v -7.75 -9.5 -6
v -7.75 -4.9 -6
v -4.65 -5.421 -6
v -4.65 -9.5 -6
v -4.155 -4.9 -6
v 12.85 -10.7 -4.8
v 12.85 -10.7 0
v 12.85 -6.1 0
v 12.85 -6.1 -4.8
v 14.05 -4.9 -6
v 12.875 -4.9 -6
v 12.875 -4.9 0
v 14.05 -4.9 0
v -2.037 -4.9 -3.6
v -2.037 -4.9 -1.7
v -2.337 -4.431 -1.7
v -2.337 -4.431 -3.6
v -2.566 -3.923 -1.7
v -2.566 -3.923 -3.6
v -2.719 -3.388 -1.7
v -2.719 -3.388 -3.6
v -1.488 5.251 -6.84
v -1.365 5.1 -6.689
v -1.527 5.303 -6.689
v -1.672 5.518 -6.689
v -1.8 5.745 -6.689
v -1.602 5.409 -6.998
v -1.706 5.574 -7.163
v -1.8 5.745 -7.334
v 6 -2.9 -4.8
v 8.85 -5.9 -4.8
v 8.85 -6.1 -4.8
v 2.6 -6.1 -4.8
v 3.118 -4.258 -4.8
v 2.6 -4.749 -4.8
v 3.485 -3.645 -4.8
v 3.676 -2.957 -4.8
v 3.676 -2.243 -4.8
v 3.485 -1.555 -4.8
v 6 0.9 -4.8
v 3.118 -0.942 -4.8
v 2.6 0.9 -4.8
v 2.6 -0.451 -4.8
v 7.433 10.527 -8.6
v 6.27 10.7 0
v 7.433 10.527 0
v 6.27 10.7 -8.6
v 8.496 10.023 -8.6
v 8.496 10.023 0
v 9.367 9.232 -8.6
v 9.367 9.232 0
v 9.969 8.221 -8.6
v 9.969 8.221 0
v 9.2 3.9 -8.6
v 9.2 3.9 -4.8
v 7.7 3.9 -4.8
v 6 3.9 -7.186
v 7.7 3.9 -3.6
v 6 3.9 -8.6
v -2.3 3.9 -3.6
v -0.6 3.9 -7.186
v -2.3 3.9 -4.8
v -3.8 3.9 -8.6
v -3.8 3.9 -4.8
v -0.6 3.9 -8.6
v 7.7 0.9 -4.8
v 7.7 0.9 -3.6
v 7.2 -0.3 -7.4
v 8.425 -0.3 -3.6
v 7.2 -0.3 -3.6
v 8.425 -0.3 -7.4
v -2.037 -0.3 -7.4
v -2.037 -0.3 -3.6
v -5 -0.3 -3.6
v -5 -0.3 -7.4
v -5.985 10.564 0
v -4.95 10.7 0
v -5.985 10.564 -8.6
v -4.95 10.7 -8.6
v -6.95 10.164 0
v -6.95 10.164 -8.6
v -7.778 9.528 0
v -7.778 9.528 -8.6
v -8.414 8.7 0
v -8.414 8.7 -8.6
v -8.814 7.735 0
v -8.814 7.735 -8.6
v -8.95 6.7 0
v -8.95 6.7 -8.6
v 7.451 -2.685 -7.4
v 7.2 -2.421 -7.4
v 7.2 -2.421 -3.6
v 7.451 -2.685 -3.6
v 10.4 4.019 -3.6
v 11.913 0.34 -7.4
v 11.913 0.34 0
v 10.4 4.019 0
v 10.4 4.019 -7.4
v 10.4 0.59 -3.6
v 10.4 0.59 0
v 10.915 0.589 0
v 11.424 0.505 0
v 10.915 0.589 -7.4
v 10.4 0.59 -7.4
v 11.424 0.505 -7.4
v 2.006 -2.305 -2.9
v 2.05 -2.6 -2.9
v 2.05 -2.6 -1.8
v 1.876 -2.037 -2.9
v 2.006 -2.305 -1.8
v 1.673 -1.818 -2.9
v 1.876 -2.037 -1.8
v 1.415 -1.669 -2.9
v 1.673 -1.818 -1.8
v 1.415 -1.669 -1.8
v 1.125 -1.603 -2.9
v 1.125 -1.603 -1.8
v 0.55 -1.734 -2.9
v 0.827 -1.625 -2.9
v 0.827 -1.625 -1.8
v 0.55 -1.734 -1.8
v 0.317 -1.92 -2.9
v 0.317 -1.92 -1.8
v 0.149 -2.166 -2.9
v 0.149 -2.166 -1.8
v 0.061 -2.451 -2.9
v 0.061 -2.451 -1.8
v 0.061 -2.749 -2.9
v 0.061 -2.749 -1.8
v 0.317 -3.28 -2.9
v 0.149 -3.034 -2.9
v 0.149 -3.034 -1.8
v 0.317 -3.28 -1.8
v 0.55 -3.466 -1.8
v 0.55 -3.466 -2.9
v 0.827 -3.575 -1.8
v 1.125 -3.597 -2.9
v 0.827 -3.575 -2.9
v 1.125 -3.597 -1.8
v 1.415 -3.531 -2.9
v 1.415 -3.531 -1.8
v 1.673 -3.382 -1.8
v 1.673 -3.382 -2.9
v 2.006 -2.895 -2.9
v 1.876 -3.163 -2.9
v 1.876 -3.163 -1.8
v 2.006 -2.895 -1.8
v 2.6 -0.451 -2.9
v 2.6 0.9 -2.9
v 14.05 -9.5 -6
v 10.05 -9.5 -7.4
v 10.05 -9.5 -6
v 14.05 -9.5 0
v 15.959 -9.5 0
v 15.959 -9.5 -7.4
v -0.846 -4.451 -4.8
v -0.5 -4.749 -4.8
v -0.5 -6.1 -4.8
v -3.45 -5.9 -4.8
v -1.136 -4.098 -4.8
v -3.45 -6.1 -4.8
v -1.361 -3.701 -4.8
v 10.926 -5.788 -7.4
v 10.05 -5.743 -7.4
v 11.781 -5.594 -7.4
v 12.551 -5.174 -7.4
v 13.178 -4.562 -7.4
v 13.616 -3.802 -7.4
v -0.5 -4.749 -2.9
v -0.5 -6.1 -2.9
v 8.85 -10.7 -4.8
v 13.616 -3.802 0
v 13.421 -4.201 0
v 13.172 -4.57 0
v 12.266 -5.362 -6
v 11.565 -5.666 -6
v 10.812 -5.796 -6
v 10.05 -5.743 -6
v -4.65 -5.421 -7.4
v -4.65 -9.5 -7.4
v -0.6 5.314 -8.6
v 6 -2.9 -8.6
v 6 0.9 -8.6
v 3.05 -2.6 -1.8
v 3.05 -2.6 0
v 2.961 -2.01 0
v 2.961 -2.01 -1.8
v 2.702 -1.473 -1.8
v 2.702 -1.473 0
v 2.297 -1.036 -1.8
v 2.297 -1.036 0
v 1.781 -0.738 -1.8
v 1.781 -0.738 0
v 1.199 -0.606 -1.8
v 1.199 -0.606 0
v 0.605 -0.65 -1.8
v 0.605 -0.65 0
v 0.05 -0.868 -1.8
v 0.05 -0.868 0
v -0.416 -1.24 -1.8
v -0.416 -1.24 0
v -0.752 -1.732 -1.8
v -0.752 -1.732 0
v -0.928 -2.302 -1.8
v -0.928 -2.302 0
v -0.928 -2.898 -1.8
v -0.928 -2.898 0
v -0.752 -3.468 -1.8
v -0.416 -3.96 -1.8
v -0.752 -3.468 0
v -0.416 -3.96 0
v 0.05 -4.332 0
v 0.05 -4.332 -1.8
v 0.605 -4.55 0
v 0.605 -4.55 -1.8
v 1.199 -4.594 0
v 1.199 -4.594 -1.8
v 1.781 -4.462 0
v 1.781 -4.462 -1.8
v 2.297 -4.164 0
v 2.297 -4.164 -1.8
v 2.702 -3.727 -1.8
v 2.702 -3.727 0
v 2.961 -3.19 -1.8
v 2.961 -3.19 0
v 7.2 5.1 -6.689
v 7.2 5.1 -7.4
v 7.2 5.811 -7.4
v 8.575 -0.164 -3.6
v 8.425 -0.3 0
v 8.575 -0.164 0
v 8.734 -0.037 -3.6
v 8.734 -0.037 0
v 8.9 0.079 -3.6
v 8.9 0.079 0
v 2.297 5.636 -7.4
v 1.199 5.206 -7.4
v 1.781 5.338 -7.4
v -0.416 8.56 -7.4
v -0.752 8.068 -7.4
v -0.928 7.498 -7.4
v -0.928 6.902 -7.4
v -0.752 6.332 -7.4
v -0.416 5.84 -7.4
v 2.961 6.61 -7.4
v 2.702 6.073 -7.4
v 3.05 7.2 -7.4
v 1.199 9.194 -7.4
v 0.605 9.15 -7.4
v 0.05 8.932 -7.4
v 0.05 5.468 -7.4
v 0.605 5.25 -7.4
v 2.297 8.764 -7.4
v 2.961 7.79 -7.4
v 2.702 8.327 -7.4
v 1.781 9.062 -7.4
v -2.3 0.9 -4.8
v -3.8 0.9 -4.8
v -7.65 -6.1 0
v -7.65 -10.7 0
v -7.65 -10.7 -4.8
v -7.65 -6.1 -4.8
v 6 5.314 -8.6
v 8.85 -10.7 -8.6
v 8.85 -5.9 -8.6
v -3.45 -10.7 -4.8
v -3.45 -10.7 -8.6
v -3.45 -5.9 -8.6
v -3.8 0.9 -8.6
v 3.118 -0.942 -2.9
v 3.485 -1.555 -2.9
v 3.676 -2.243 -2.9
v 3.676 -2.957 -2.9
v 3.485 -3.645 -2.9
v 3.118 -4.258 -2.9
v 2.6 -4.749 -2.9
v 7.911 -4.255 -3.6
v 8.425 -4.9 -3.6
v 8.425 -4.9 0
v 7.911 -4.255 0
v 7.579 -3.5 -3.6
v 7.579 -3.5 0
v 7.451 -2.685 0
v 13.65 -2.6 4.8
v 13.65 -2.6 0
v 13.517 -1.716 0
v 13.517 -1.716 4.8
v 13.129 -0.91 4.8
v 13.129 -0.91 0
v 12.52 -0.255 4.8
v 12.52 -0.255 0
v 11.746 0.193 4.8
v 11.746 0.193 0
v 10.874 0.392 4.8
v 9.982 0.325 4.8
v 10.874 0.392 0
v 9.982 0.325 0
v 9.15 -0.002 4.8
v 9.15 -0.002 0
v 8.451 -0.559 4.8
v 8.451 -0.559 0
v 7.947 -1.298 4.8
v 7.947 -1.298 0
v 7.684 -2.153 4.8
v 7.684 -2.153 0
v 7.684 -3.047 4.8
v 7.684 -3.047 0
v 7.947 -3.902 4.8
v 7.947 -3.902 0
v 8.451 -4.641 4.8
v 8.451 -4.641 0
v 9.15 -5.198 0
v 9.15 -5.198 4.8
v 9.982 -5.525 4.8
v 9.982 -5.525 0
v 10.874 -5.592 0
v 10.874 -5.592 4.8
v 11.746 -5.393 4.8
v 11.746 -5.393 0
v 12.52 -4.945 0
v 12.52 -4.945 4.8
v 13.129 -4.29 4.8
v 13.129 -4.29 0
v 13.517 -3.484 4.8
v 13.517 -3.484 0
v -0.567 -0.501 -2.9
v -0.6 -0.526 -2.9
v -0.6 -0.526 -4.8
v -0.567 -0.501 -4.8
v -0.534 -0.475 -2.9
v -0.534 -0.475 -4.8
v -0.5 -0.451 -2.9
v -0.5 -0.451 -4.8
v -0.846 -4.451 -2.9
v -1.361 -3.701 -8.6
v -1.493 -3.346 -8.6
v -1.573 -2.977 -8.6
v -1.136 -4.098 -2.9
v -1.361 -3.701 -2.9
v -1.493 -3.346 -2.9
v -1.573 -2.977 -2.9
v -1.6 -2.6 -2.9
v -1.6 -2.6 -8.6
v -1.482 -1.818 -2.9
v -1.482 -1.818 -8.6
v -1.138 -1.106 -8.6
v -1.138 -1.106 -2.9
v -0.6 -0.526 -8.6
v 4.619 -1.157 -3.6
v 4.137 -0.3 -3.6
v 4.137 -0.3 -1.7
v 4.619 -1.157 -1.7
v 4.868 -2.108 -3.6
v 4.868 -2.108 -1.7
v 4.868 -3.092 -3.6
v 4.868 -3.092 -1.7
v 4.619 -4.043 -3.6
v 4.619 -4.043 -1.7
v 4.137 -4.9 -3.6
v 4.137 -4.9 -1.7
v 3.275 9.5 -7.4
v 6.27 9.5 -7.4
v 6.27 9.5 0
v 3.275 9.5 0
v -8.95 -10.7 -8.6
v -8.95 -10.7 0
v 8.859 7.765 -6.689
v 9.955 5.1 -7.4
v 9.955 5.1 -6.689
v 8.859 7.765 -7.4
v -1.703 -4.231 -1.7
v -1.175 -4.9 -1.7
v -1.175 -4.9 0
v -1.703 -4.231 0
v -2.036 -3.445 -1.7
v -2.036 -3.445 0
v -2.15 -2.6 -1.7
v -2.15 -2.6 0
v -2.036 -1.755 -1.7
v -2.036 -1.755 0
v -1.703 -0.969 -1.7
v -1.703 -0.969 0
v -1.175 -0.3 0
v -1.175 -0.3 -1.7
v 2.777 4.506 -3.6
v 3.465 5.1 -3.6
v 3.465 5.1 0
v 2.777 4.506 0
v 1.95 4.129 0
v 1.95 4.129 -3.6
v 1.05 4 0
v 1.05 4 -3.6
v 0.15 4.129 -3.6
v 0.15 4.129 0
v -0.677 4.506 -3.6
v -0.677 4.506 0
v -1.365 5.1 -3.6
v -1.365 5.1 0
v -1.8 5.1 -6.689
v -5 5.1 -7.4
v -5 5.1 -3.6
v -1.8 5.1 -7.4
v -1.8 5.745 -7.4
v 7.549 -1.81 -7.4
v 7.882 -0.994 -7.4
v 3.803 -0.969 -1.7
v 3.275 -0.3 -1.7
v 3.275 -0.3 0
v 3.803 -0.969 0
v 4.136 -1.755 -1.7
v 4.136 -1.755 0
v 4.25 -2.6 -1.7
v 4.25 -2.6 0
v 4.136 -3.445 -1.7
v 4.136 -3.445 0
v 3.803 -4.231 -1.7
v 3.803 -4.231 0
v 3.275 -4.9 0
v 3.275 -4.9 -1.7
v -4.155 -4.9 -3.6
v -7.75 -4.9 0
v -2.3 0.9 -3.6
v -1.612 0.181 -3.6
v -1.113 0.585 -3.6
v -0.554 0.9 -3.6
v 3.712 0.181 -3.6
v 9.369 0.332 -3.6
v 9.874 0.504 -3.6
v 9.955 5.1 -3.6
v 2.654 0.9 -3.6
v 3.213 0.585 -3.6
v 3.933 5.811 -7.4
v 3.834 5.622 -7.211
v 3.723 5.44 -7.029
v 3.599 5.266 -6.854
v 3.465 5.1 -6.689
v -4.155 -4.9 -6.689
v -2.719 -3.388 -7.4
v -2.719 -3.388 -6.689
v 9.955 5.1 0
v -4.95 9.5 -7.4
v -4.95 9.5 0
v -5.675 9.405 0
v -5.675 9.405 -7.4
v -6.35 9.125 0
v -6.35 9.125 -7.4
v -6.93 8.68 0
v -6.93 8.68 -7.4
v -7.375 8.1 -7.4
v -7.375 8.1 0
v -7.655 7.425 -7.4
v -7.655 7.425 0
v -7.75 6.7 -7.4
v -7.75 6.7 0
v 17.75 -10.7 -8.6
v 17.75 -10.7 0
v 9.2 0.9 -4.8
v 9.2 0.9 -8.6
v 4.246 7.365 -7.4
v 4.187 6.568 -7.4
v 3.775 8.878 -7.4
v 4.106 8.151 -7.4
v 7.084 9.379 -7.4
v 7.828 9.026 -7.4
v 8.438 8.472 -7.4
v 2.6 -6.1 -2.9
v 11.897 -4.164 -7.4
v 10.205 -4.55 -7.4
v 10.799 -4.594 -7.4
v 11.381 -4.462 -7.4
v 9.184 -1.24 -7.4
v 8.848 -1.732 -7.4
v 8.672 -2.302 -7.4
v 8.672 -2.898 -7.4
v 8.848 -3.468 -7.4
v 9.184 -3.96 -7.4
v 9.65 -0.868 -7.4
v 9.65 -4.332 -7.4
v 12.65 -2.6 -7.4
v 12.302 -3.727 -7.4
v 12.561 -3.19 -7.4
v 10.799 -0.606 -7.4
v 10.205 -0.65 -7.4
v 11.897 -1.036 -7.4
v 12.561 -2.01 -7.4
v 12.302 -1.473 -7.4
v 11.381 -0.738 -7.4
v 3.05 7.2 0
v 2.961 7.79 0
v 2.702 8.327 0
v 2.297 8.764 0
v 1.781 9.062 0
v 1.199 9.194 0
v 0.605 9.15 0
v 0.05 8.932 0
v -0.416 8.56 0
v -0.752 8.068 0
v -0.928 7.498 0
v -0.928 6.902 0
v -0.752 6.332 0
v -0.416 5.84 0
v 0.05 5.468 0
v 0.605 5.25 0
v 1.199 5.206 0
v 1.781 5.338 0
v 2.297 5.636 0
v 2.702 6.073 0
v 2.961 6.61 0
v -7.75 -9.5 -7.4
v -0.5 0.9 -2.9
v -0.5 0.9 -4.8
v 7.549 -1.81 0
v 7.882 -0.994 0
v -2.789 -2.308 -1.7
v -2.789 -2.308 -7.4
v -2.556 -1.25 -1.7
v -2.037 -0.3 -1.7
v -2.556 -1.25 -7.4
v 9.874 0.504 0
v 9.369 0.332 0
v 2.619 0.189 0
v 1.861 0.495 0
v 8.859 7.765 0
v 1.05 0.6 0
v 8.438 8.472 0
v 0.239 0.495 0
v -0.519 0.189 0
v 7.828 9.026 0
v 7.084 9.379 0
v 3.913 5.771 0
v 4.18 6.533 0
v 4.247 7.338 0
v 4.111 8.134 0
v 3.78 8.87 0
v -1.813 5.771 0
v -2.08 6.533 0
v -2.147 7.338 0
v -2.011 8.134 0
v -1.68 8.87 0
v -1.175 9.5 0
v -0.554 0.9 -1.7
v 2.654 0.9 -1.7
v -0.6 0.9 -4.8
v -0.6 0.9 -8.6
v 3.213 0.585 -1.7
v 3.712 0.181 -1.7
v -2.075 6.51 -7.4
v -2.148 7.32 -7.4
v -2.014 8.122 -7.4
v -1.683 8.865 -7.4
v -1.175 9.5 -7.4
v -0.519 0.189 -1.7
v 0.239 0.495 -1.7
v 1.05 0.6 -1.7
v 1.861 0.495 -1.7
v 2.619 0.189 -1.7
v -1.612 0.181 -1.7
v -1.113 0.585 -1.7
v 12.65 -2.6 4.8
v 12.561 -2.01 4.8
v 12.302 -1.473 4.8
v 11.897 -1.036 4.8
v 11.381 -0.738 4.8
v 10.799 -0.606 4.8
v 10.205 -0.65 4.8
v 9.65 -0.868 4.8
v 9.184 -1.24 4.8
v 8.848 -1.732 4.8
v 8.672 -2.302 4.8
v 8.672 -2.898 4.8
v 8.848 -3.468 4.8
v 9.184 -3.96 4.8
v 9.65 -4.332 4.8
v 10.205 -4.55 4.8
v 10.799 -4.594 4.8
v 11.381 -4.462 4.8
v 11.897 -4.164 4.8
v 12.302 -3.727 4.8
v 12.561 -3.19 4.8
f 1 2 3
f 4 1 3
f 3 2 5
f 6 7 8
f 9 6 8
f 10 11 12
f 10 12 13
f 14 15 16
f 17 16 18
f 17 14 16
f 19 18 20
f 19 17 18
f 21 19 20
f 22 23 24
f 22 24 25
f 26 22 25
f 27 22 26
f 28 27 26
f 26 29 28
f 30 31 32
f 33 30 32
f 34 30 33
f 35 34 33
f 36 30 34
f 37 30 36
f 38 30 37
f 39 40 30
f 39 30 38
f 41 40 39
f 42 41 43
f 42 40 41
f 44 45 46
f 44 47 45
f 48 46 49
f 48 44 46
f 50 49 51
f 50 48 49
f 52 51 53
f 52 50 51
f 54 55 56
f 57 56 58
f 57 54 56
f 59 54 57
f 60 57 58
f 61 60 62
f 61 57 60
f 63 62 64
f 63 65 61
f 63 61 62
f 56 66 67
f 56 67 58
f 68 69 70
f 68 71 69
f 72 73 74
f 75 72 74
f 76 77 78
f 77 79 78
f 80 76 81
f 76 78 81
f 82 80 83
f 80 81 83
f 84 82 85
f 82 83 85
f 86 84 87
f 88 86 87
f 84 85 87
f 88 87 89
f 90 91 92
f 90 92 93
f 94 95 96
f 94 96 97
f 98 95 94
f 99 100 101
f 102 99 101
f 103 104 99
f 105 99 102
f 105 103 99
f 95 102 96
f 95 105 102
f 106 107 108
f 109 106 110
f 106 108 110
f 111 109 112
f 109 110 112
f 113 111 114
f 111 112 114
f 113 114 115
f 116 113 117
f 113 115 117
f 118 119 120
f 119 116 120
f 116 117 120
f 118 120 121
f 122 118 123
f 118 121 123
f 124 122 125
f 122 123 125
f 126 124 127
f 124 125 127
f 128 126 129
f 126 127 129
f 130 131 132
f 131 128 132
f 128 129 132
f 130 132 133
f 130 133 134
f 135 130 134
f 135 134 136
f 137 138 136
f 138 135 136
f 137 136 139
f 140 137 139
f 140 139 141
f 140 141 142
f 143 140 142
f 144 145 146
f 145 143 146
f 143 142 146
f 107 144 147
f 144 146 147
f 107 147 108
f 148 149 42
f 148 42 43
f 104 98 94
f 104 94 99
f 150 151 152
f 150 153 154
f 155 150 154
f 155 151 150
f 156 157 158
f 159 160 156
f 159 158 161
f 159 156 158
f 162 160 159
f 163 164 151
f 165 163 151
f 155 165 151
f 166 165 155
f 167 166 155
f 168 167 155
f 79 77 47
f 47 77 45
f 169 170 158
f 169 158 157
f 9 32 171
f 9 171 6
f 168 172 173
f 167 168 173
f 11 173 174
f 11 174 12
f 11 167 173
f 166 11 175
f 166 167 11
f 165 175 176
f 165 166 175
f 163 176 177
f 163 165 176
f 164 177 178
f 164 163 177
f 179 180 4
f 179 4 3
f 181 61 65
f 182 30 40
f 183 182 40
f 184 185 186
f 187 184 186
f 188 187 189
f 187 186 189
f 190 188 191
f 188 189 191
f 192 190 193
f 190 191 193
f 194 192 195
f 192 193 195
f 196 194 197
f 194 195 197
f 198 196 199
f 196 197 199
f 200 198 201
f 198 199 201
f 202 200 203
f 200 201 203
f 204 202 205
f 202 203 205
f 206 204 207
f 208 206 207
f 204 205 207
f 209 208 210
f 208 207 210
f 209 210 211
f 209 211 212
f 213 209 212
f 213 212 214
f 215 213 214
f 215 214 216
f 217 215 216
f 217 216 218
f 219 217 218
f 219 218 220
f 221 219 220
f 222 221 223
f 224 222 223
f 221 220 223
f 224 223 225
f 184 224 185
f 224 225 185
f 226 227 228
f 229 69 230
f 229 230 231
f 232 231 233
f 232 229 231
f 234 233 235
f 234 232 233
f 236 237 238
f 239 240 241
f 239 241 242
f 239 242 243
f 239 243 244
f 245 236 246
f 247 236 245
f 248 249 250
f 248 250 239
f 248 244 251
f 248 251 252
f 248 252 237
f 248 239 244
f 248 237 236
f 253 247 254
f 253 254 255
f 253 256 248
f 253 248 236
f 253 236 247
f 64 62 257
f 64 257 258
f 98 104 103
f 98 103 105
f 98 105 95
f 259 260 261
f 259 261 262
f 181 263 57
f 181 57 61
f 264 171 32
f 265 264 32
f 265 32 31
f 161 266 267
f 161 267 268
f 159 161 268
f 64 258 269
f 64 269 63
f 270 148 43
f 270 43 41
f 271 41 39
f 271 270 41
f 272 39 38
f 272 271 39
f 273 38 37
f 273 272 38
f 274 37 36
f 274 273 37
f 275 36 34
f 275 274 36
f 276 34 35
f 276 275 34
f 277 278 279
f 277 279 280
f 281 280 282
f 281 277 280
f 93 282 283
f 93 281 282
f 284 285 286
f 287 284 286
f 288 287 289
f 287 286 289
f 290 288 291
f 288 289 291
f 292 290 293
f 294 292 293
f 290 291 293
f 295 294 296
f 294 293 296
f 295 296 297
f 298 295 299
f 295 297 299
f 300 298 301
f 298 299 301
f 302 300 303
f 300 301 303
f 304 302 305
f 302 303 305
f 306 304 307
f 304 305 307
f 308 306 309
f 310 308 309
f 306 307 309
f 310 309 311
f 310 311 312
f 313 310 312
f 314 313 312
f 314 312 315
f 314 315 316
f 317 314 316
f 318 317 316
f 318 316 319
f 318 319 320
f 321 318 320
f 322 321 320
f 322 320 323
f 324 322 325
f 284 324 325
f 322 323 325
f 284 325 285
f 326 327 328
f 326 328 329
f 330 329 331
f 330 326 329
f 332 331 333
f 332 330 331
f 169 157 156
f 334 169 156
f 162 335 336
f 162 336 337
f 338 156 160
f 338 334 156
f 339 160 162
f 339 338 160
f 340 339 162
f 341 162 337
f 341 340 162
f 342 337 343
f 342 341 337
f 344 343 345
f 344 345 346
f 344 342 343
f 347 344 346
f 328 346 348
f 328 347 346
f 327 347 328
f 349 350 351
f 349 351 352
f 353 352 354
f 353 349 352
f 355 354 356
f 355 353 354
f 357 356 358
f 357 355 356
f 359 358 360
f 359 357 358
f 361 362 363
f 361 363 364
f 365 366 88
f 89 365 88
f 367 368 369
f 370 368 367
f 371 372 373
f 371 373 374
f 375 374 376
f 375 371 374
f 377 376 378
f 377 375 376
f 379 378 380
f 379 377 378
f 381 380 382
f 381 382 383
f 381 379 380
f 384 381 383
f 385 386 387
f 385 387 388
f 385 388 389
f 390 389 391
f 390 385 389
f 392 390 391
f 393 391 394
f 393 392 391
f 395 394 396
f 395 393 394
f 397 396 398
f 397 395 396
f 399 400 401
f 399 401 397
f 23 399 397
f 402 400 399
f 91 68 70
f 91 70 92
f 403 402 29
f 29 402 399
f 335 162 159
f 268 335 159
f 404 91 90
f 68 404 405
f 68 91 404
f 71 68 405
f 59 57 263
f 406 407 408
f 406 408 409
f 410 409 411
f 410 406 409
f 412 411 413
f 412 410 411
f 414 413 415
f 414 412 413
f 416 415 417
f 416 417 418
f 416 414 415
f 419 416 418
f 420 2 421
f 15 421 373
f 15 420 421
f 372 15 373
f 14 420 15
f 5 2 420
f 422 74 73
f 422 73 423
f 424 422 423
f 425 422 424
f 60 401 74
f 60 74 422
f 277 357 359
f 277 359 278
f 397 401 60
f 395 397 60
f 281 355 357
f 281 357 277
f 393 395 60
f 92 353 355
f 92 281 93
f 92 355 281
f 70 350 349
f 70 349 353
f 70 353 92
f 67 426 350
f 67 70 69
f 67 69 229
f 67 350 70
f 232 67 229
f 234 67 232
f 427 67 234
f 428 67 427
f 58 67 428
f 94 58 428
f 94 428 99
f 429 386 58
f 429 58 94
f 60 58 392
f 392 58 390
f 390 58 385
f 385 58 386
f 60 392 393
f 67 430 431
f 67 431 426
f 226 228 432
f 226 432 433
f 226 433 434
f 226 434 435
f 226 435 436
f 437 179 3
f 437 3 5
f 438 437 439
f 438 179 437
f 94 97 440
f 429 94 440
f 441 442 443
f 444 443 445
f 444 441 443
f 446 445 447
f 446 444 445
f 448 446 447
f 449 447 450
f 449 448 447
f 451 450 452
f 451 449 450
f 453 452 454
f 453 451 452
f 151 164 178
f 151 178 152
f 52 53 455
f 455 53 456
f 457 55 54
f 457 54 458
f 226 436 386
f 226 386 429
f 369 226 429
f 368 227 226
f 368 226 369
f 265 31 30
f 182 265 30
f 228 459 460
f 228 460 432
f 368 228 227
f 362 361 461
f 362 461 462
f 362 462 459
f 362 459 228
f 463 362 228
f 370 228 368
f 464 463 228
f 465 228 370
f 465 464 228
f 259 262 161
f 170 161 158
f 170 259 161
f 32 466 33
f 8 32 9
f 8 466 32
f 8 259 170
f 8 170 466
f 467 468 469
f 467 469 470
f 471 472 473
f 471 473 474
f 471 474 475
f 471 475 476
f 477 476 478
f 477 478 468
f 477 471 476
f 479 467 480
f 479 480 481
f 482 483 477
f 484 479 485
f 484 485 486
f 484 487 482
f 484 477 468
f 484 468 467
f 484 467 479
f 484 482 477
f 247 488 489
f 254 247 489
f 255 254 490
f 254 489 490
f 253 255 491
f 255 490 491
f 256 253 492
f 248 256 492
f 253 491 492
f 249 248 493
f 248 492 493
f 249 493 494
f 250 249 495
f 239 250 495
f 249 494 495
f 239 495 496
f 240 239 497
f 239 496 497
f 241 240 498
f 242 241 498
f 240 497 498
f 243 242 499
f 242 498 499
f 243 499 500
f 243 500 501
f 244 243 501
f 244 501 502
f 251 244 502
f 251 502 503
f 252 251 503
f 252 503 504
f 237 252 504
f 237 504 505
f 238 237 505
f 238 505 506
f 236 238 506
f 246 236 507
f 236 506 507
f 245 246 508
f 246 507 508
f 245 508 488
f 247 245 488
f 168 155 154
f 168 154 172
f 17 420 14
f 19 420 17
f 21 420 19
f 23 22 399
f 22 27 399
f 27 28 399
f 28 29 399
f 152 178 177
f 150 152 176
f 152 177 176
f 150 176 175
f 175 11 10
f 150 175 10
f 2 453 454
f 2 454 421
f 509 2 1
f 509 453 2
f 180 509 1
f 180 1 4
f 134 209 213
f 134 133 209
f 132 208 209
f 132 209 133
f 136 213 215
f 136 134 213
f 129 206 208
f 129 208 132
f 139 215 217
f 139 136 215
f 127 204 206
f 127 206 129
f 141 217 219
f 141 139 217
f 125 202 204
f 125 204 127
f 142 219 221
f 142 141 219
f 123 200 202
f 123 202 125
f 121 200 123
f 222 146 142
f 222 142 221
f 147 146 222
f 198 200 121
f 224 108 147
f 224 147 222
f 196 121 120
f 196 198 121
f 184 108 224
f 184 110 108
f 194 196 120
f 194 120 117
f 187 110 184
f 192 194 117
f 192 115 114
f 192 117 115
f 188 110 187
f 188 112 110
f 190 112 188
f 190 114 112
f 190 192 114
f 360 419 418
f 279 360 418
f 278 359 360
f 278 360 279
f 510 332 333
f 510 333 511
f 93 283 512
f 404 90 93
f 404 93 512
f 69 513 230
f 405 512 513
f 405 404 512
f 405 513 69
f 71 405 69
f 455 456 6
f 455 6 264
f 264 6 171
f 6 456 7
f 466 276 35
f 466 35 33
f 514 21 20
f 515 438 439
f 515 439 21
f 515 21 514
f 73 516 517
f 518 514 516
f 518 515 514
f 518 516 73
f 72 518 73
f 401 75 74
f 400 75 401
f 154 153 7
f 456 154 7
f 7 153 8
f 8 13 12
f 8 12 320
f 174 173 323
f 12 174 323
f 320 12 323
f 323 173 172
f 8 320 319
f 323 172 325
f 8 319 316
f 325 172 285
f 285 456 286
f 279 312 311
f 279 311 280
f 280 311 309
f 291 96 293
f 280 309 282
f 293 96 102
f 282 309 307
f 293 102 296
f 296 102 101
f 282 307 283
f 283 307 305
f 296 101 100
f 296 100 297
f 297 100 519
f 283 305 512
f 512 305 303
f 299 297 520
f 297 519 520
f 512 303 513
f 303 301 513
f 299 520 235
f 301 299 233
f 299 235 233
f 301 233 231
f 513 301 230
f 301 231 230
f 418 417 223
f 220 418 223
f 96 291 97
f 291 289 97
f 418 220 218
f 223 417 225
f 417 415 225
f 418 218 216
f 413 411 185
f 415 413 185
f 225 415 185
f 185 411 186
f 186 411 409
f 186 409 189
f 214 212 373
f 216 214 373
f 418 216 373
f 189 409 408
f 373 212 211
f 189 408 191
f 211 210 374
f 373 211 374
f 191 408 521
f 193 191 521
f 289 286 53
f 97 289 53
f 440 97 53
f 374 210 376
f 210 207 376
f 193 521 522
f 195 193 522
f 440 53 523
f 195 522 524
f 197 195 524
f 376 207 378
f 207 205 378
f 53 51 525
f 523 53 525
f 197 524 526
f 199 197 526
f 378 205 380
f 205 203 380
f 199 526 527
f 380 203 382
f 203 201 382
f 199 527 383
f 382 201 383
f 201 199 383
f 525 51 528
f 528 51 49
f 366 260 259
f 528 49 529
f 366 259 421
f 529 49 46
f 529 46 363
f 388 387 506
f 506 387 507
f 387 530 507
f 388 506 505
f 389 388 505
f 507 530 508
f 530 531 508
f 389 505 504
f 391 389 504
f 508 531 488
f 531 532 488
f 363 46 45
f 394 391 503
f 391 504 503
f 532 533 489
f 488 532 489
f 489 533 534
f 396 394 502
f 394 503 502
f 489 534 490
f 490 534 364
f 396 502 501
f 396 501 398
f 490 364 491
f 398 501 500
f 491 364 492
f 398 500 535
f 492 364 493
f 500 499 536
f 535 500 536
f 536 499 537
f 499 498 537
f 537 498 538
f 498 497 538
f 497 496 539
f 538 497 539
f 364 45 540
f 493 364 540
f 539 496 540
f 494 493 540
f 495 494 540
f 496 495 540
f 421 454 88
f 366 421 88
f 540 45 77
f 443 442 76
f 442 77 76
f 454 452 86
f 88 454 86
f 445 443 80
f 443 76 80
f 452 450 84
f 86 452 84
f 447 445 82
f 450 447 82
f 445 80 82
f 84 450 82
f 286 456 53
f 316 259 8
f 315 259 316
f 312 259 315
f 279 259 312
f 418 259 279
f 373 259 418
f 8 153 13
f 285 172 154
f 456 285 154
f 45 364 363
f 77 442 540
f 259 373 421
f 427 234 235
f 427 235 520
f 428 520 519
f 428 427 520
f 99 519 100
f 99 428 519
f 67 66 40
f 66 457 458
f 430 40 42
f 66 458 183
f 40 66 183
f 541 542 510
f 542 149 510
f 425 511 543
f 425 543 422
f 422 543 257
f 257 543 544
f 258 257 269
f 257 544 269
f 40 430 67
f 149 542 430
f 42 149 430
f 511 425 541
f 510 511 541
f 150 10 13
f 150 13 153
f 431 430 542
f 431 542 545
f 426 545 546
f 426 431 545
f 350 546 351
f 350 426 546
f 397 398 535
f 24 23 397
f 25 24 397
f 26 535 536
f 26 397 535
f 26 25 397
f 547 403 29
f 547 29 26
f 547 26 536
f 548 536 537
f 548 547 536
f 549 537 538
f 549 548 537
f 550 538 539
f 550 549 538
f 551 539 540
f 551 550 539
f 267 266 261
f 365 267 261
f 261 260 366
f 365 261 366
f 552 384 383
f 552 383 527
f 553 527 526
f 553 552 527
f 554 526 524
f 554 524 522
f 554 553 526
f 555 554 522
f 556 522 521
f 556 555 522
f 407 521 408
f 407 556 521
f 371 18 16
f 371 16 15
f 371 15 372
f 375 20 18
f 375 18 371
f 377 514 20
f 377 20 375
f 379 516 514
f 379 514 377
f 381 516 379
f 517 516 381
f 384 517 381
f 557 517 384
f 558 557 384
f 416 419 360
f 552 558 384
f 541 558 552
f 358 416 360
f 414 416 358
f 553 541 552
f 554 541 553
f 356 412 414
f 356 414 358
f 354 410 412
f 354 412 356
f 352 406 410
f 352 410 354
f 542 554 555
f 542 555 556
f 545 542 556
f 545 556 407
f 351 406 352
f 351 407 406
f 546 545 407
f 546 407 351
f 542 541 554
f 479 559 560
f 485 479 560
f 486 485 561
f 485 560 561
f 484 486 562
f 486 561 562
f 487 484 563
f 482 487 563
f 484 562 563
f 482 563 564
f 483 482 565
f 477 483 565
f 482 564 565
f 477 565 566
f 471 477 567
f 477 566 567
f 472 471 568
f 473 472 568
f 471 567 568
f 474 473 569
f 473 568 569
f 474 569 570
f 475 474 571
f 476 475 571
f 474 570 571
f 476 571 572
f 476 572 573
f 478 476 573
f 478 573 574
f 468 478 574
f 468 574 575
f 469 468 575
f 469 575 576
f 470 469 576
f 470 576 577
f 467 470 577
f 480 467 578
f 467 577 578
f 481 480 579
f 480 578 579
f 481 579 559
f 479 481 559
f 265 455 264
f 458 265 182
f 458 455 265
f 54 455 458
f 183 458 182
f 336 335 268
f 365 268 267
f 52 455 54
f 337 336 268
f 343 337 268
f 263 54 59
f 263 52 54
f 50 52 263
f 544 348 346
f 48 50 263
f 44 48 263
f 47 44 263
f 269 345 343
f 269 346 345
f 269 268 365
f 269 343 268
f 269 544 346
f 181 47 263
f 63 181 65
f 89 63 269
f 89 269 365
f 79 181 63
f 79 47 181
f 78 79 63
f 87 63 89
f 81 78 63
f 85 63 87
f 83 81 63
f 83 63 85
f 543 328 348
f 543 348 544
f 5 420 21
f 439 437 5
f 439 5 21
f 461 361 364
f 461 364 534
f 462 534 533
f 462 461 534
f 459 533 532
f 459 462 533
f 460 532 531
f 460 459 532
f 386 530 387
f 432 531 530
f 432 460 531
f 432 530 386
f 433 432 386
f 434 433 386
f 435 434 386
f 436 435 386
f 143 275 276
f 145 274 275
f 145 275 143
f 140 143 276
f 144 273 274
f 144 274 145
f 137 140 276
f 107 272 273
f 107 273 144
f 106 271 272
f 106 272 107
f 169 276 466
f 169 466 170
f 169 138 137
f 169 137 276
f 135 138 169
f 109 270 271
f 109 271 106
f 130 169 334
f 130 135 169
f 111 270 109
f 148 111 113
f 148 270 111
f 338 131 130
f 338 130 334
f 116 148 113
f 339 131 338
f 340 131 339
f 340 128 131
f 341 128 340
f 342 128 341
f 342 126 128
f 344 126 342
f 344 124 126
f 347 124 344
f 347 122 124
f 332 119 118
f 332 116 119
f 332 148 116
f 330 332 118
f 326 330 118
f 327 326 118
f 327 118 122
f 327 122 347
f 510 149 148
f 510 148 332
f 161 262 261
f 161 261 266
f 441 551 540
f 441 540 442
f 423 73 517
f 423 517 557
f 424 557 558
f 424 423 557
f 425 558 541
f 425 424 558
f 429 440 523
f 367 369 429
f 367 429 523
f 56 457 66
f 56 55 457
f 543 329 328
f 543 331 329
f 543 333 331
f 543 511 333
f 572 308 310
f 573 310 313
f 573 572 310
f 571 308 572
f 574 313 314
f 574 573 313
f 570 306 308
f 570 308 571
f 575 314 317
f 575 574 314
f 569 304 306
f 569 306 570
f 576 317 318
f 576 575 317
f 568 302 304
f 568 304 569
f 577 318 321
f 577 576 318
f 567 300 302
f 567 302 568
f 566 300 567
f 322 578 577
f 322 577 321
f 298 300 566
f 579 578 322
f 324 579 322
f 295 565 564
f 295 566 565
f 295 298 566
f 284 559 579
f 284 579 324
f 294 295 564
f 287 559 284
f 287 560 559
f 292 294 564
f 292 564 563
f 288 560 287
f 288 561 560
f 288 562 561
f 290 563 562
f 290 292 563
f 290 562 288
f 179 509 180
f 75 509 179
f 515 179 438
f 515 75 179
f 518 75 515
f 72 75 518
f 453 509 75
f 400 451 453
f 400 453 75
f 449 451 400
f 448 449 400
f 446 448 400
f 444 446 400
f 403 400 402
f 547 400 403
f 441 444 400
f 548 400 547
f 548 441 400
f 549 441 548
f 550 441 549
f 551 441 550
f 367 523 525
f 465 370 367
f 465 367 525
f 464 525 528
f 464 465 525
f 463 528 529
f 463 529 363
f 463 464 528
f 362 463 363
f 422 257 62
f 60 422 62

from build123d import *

# Parameters (mm, degrees)
SKETCH1_W           = 17.9
SKETCH1_H           = 21.4
SKETCH1_R           = 1
BOSS_EXTRUDE1_DEPTH = 8.6
FILLET1_R           = 4
SKETCH2_R           = 2
CUT_EXTRUDE1_DEPTH  = 1.8
CUT_EXTRUDE2_START  = -3.8
SKETCH4_R           = 2.65
SKETCH4_W           = 6.6
SKETCH4_H           = 3.8
SKETCH4_W_2         = 12.3
SKETCH4_H_2         = 4.8
CUT_EXTRUDE2_DEPTH  = 3.8
SKETCH5_W           = 10
SKETCH5_H           = 3
CUT_EXTRUDE3_DEPTH  = 22.27422149
CUT_EXTRUDE4_START  = -1.9
SKETCH6_R           = 1
CUT_EXTRUDE4_DEPTH  = 1.9
SKETCH7_W           = 20.5
SKETCH7_H           = 4.6
CUT_EXTRUDE5_DEPTH  = 4.8
SKETCH9_W           = 6.6
SKETCH9_H           = 5
CUT_EXTRUDE6_DEPTH  = 1
SKETCH3_R           = 2
CUT_EXTRUDE7_DEPTH  = 7.4
SKETCH10_R          = 3
BOSS_EXTRUDE2_DEPTH = 4.8
SKETCH11_R          = 2
CUT_EXTRUDE8_DEPTH  = 12.2
SHELL1_START        = -6.688730163
SHELL1_DEPTH        = 6.688730163
SHELL1_START_2      = -3.6
SHELL1_2_OUTLINE_W  = 1.5
SHELL1_2_OUTLINE_H  = 5.4
SHELL1_2_DEPTH      = 3.6
SHELL1_START_3      = -7.4
SHELL1_3_DEPTH      = 1.4
SHELL1_START_4      = -1.7
SHELL1_4_DEPTH      = 1.7
SHELL1_5_DEPTH      = 0.711269837
SHELL1_START_5      = -7.333566942
SHELL1_6_DEPTH      = 0.644836779
SHELL1_START_6      = 3.274859546
SHELL1_7_DEPTH      = 3.925140454
SHELL1_START_7      = -1.8
SHELL1_8_DEPTH      = 0.435460706
CUT_EXTRUDE9_START  = -3.6
CUT_EXTRUDE9_DEPTH  = 3.6
CUT_EXTRUDE10_START = -1.7
CUT_EXTRUDE10_DEPTH = 1.7


with BuildPart() as part:
    # Sketch1 → Boss-Extrude1 (new body)
    # profile 1 of 2: a face of its own
    with BuildSketch(Plane.XY):
        Rectangle(SKETCH1_W, SKETCH1_H)
        with Locations((1.05, -2.6)):
            Circle(SKETCH1_R, mode=Mode.SUBTRACT)
    # profile 2 of 2: a face of its own
    with BuildSketch(Plane.XY):
        Polygon((17.75, -10.7), (8.95, -10.7), (8.95, 10.7), align=None)
    extrude(amount=-BOSS_EXTRUDE1_DEPTH)

    # Fillet1
    fillet1_edges = [part.edges().sort_by_distance(p)[0] for p in [
        (-8.95, 10.7, -4.3),
        (8.95, 10.7, -4.3),
    ]]
    fillet(fillet1_edges, radius=FILLET1_R)

    # Sketch2 → Cut-Extrude1 (cut)
    with BuildSketch(Plane.XY):
        with Locations((1.05, -2.6)):
            Circle(SKETCH2_R)
    extrude(amount=-CUT_EXTRUDE1_DEPTH, mode=Mode.SUBTRACT)

    # Sketch4 → Cut-Extrude2 (cut)
    with BuildSketch(Plane(origin=(0, 0, -8.6), x_dir=(-1, 0, 0), z_dir=(0, 0, -1)).offset(CUT_EXTRUDE2_START)):
        Polygon((-9.2, 0.9), (-6, 0.9), (0.6, 0.9), (3.8, 0.9), (3.8, 3.9), (-9.2, 3.9), align=None)
        with Locations((-1.05, -2.6)):
            Circle(SKETCH4_R)
        with Locations((-2.7, -1)):
            Rectangle(SKETCH4_W, SKETCH4_H)
        with BuildLine():
            ThreePointArc((0.6, -0.526355865), (-2.334562661, -0.28215644), (-3.682964109, -2.9))
            Line((-3.682964109, -2.9), (-2.003939201, -2.9))
            ThreePointArc((-2.003939201, -2.9), (-1.201757699, -1.611582274), (-0.05, -2.6))
            ThreePointArc((-0.05, -2.6), (-0.061582274, -2.751757699), (-0.096060799, -2.9))
            Line((-0.096060799, -2.9), (0.6, -2.9))
            Line((0.6, -2.9), (0.6, -0.526355865))
        make_face()
        with BuildLine():
            Line((-2.003939201, -2.9), (-3.682964109, -2.9))
            ThreePointArc((-3.682964109, -2.9), (-1.465474787, -5.217227675), (1.360616498, -3.700648945))
            Line((1.360616498, -3.700648945), (0.6, -2.9))
            Line((0.6, -2.9), (-0.096060799, -2.9))
            ThreePointArc((-0.096060799, -2.9), (-1.05, -3.6), (-2.003939201, -2.9))
        make_face()
        with BuildLine():
            Line((0.6, -2.9), (1.360616498, -3.700648945))
            ThreePointArc((1.360616498, -3.700648945), (1.539462658, -3.163190146), (1.6, -2.6))
            ThreePointArc((1.6, -2.6), (1.336943652, -1.448913557), (0.6, -0.526355865))
            Line((0.6, -0.526355865), (0.6, -2.9))
        make_face()
        Polygon((-6, -2.9), (0.6, -2.9), (3.45, -5.9), (-8.85, -5.9), align=None)
        with Locations((-2.7, -8.3)):
            Rectangle(SKETCH4_W_2, SKETCH4_H_2)
    extrude(amount=CUT_EXTRUDE2_DEPTH, mode=Mode.SUBTRACT)

    # Sketch5 → Cut-Extrude3 (cut, through all)
    with BuildSketch(Plane(origin=(0, 0, -4.8), x_dir=(-1, 0, 0), z_dir=(0, 0, -1))):
        with Locations((-2.7, 2.4)):
            Rectangle(SKETCH5_W, SKETCH5_H)
    extrude(amount=-CUT_EXTRUDE3_DEPTH, mode=Mode.SUBTRACT)

    # Sketch6 → Cut-Extrude4 (cut)
    # profile 1 of 5: a face of its own
    with BuildSketch(Plane(origin=(0, 0, -4.8), x_dir=(-1, 0, 0), z_dir=(0, 0, -1)).offset(CUT_EXTRUDE4_START)):
        with BuildLine():
            ThreePointArc((-2.6, -0.450581474), (-3.7, -2.6), (-2.6, -4.749418526))
            Line((-2.6, -4.749418526), (-2.6, -0.450581474))
        make_face()
    # profile 2 of 5: a face of its own
    with BuildSketch(Plane(origin=(0, 0, -4.8), x_dir=(-1, 0, 0), z_dir=(0, 0, -1)).offset(CUT_EXTRUDE4_START)):
        with BuildLine():
            Line((-2.6, -0.450581474), (-2.6, -4.749418526))
            ThreePointArc((-2.6, -4.749418526), (-1.05, -5.25), (0.5, -4.749418526))
            Line((0.5, -4.749418526), (0.5, -0.450581474))
            ThreePointArc((0.5, -0.450581474), (-1.05, 0.05), (-2.6, -0.450581474))
        make_face()
        with Locations(Location((-1.05, -2.6, 0), (0, 0, 180))):
            Circle(SKETCH6_R, mode=Mode.SUBTRACT)
    # profile 3 of 5: a face of its own
    with BuildSketch(Plane(origin=(0, 0, -4.8), x_dir=(-1, 0, 0), z_dir=(0, 0, -1)).offset(CUT_EXTRUDE4_START)):
        with BuildLine():
            Line((-2.6, 0.9), (-2.6, -0.450581474))
            ThreePointArc((-2.6, -0.450581474), (-1.05, 0.05), (0.5, -0.450581474))
            Line((0.5, -0.450581474), (0.5, 0.9))
            Line((0.5, 0.9), (-2.6, 0.9))
        make_face()
    # profile 4 of 5: a face of its own
    with BuildSketch(Plane(origin=(0, 0, -4.8), x_dir=(-1, 0, 0), z_dir=(0, 0, -1)).offset(CUT_EXTRUDE4_START)):
        with BuildLine():
            Line((0.5, -0.450581474), (0.5, -4.749418526))
            ThreePointArc((0.5, -4.749418526), (0.998560511, -4.281041294), (1.360616498, -3.700648945))
            ThreePointArc((1.360616498, -3.700648945), (1.539462658, -3.163190146), (1.6, -2.6))
            ThreePointArc((1.6, -2.6), (1.336943652, -1.448913557), (0.6, -0.526355865))
            ThreePointArc((0.6, -0.526355865), (0.550448512, -0.487876765), (0.5, -0.450581474))
        make_face()
    # profile 5 of 5: a face of its own
    with BuildSketch(Plane(origin=(0, 0, -4.8), x_dir=(-1, 0, 0), z_dir=(0, 0, -1)).offset(CUT_EXTRUDE4_START)):
        with BuildLine():
            Line((-2.6, -4.749418526), (-2.6, -6.1))
            Line((-2.6, -6.1), (0.5, -6.1))
            Line((0.5, -6.1), (0.5, -4.749418526))
            ThreePointArc((0.5, -4.749418526), (-1.05, -5.25), (-2.6, -4.749418526))
        make_face()
    extrude(amount=CUT_EXTRUDE4_DEPTH, mode=Mode.SUBTRACT)

    # Sketch7 → Cut-Extrude5 (cut)
    with BuildSketch(Plane.XY):
        with Locations((2.6, -8.4)):
            Rectangle(SKETCH7_W, SKETCH7_H)
    extrude(amount=-CUT_EXTRUDE5_DEPTH, mode=Mode.SUBTRACT)

    # Sketch9 → Cut-Extrude6 (cut)
    with BuildSketch(Plane(origin=(0, -2.35, -2.35), x_dir=(-1, 0, 0), z_dir=(0, -0.7071067811865561, -0.7071067811865389))):
        with Locations((-2.7, 9.217514421)):
            Rectangle(SKETCH9_W, SKETCH9_H)
    extrude(amount=-CUT_EXTRUDE6_DEPTH, mode=Mode.SUBTRACT)

    # Sketch3 → Cut-Extrude7 (cut)
    with BuildSketch(Plane.XY):
        with Locations((1.05, 7.2)):
            Circle(SKETCH3_R)
    extrude(amount=-CUT_EXTRUDE7_DEPTH, mode=Mode.SUBTRACT)

    # Sketch10 → Boss-Extrude2 (add)
    with BuildSketch(Plane.XY):
        with Locations((10.65, -2.6)):
            Circle(SKETCH10_R)
    extrude(amount=BOSS_EXTRUDE2_DEPTH)

    # Sketch11 → Cut-Extrude8 (cut)
    with BuildSketch(Plane.XY.offset(4.8)):
        with Locations((10.65, -2.6)):
            Circle(SKETCH11_R)
    extrude(amount=-CUT_EXTRUDE8_DEPTH, mode=Mode.SUBTRACT)

    # Shell1: read off the stored shape, not the designer's step
    # Shell1 outline → Shell1 (cut)
    with BuildSketch(Plane.XY.offset(SHELL1_START)):
        with BuildLine():
            Line((8.425140454, -0.3), (7.2, -0.3))
            Line((7.2, -0.3), (7.2, -2.420869782))
            Line((7.2, -2.420869782), (7.451135024, -2.685222439))
            ThreePointArc((7.451135024, -2.685222439), (7.687481064, -1.390255582), (8.425140454, -0.3))
        make_face()
        with BuildLine():
            Line((-4.155173707, -4.9), (-2.718545428, -3.387759707))
            ThreePointArc((-2.718545428, -3.387759707), (-2.709630033, -1.770734053), (-2.037474696, -0.3))
            Line((-2.037474696, -0.3), (-5, -0.3))
            Line((-5, -0.3), (-5, 5.1))
            Line((-5, 5.1), (-1.364539294, 5.1))
            ThreePointArc((-1.364539294, 5.1), (-2.147030716, 7.337820904), (-1.174859546, 9.5))
            Line((-1.174859546, 9.5), (-4.95, 9.5))
            ThreePointArc((-4.95, 9.5), (-6.929898987, 8.679898987), (-7.75, 6.7))
            Line((-7.75, 6.7), (-7.75, -4.9))
            Line((-7.75, -4.9), (-4.155173707, -4.9))
        make_face()
        with BuildLine():
            Line((12.874859546, -4.9), (14.05, -4.9))
            Line((14.05, -4.9), (14.05, -9.5))
            Line((14.05, -9.5), (15.959044178, -9.5))
            Line((15.959044178, -9.5), (13.615804478, -3.801667092))
            ThreePointArc((13.615804478, -3.801667092), (13.302797023, -4.389599942), (12.874859546, -4.9))
        make_face()
        with BuildLine():
            ThreePointArc((10.4, 0.590219428), (11.17143883, 0.557230043), (11.912517793, 0.340416437))
            Line((11.912517793, 0.340416437), (10.4, 4.018584707))
            Line((10.4, 4.018584707), (10.4, 0.590219428))
        make_face()
        with BuildLine():
            Line((7.2, 5.1), (9.955305861, 5.1))
            Line((9.955305861, 5.1), (8.859466499, 7.764882083))
            ThreePointArc((8.859466499, 7.764882083), (7.828444792, 9.026120142), (6.269866888, 9.5))
            Line((6.269866888, 9.5), (3.274859546, 9.5))
            ThreePointArc((3.274859546, 9.5), (4.247030716, 7.337820904), (3.464539294, 5.1))
            Line((3.464539294, 5.1), (7.2, 5.1))
        make_face()
    extrude(amount=SHELL1_DEPTH, mode=Mode.SUBTRACT)

    # Shell1 2 outline → Shell1 2 (cut)
    with BuildSketch(Plane.XY.offset(SHELL1_START_2)):
        with BuildLine():
            Line((7.2, -0.3), (4.137474696, -0.3))
            ThreePointArc((4.137474696, -0.3), (4.9, -2.6), (4.137474696, -4.9))
            Line((4.137474696, -4.9), (8.425140454, -4.9))
            ThreePointArc((8.425140454, -4.9), (7.720749783, -3.888213168), (7.451135024, -2.685222439))
            Line((7.451135024, -2.685222439), (7.2, -2.420869782))
            Line((7.2, -2.420869782), (7.2, -0.3))
        make_face()
        with BuildLine():
            Line((-4.155173707, -4.9), (-2.037474696, -4.9))
            ThreePointArc((-2.037474696, -4.9), (-2.460408902, -4.180989987), (-2.718545428, -3.387759707))
            Line((-2.718545428, -3.387759707), (-4.155173707, -4.9))
        make_face()
        with Locations((-4.25, 2.4)):
            Rectangle(SHELL1_2_OUTLINE_W, SHELL1_2_OUTLINE_H)
        with BuildLine():
            ThreePointArc((8.9, 0.079085665), (9.617859297, 0.428974342), (10.4, 0.590219428))
            Line((10.4, 0.590219428), (10.4, 4.018584707))
            Line((10.4, 4.018584707), (9.95530586, 5.1))
            Line((9.95530586, 5.1), (8.9, 5.1))
            Line((8.9, 5.1), (8.9, 0.079085665))
        make_face()
    extrude(amount=SHELL1_2_DEPTH, mode=Mode.SUBTRACT)

    # Shell1 3 outline → Shell1 3 (cut)
    with BuildSketch(Plane.XY.offset(SHELL1_START_3)):
        with BuildLine():
            Line((8.425140454, -0.3), (7.2, -0.3))
            Line((7.2, -0.3), (7.2, -2.420869782))
            Line((7.2, -2.420869782), (7.451135024, -2.685222439))
            ThreePointArc((7.451135024, -2.685222439), (7.687481064, -1.390255582), (8.425140454, -0.3))
        make_face()
        with BuildLine():
            ThreePointArc((-2.718545428, -3.387759707), (-2.709630033, -1.770734053), (-2.037474696, -0.3))
            Line((-2.037474696, -0.3), (-5, -0.3))
            Line((-5, -0.3), (-5, 5.1))
            Line((-5, 5.1), (-1.8, 5.1))
            Line((-1.8, 5.1), (-1.8, 5.744836779))
            ThreePointArc((-1.8, 5.744836779), (-2.106558657, 7.725487814), (-1.174859546, 9.5))
            Line((-1.174859546, 9.5), (-4.95, 9.5))
            ThreePointArc((-4.95, 9.5), (-6.929898987, 8.679898987), (-7.75, 6.7))
            Line((-7.75, 6.7), (-7.75, -9.5))
            Line((-7.75, -9.5), (-4.65, -9.5))
            Line((-4.65, -9.5), (-4.65, -5.420869782))
            Line((-4.65, -5.420869782), (-2.718545428, -3.387759707))
        make_face()
        with BuildLine():
            Line((10.05, -9.5), (15.959044178, -9.5))
            Line((15.959044178, -9.5), (13.615804478, -3.801667092))
            ThreePointArc((13.615804478, -3.801667092), (12.180258337, -5.410393108), (10.05, -5.743246729))
            Line((10.05, -5.743246729), (10.05, -9.5))
        make_face()
        with BuildLine():
            ThreePointArc((10.4, 0.590219428), (11.17143883, 0.557230043), (11.912517793, 0.340416437))
            Line((11.912517793, 0.340416437), (10.4, 4.018584707))
            Line((10.4, 4.018584707), (10.4, 0.590219428))
        make_face()
    extrude(amount=SHELL1_3_DEPTH, mode=Mode.SUBTRACT)

    # Shell1 4 outline → Shell1 4 (cut)
    with BuildSketch(Plane.XY.offset(SHELL1_START_4)):
        with BuildLine():
            ThreePointArc((4.137474696, -4.9), (4.9, -2.6), (4.137474696, -0.3))
            Line((4.137474696, -0.3), (3.274859546, -0.3))
            ThreePointArc((3.274859546, -0.3), (4.25, -2.6), (3.274859546, -4.9))
            Line((3.274859546, -4.9), (4.137474696, -4.9))
        make_face()
        with BuildLine():
            ThreePointArc((-2.037474696, -0.3), (-2.8, -2.6), (-2.037474696, -4.9))
            Line((-2.037474696, -4.9), (-1.174859546, -4.9))
            ThreePointArc((-1.174859546, -4.9), (-2.15, -2.6), (-1.174859546, -0.3))
            Line((-1.174859546, -0.3), (-2.037474696, -0.3))
        make_face()
    extrude(amount=SHELL1_4_DEPTH, mode=Mode.SUBTRACT)

    # Shell1 5 outline → Shell1 5 (cut)
    with BuildSketch(Plane.XY.offset(SHELL1_START_3)):
        with BuildLine():
            Line((9.95530586, 5.1), (8.859466499, 7.764882083))
            ThreePointArc((8.859466499, 7.764882083), (7.828444792, 9.026120142), (6.269866888, 9.5))
            Line((6.269866888, 9.5), (3.274859546, 9.5))
            ThreePointArc((3.274859546, 9.5), (4.247030716, 7.337820904), (3.464539294, 5.1))
            Line((3.464539294, 5.1), (7.2, 5.1))
            Line((7.2, 5.1), (9.95530586, 5.1))
        make_face()
    extrude(amount=SHELL1_5_DEPTH, mode=Mode.SUBTRACT)

    # Shell1 6 outline → Shell1 6 (cut)
    with BuildSketch(Plane.XY.offset(SHELL1_START_5)):
        with BuildLine():
            ThreePointArc((-1.364539294, 5.1), (-1.60194214, 5.409133481), (-1.8, 5.744836779))
            Line((-1.8, 5.744836779), (-1.8, 5.1))
            Line((-1.8, 5.1), (-1.364539294, 5.1))
        make_face()
    extrude(amount=SHELL1_6_DEPTH, mode=Mode.SUBTRACT)

    # Shell1 7 outline → Shell1 7 (add)
    with BuildSketch(Plane.YZ.offset(SHELL1_START_6)):
        Polygon((5.1, -7.4), (5.811269837, -7.4), (5.1, -6.688730163), align=None)
    extrude(amount=SHELL1_7_DEPTH)

    # Shell1 8 outline → Shell1 8 (add)
    with BuildSketch(Plane.YZ.offset(SHELL1_START_7)):
        Polygon((5.1, -7.333566942), (5.744836779, -7.333566942), (5.1, -6.688730163), align=None)
    extrude(amount=SHELL1_8_DEPTH)

    # Sketch14 → Cut-Extrude9 (cut)
    with BuildSketch(Plane.XY.offset(CUT_EXTRUDE9_START)):
        with BuildLine():
            Line((-1.364539294, 5.1), (-3.5, 5.1))
            Line((-3.5, 5.1), (-3.5, -0.3))
            Line((-3.5, -0.3), (-2.037474696, -0.3))
            ThreePointArc((-2.037474696, -0.3), (-1.371208921, 0.393367228), (-0.553901493, 0.9))
            Line((-0.553901493, 0.9), (-2.3, 0.9))
            Line((-2.3, 0.9), (-2.3, 3.9))
            Line((-2.3, 3.9), (7.7, 3.9))
            Line((7.7, 3.9), (7.7, 0.9))
            Line((7.7, 0.9), (2.653901493, 0.9))
            ThreePointArc((2.653901493, 0.9), (3.471208921, 0.393367228), (4.137474696, -0.3))
            Line((4.137474696, -0.3), (8.425140454, -0.3))
            ThreePointArc((8.425140454, -0.3), (8.653552258, -0.099160858), (8.9, 0.079085665))
            Line((8.9, 0.079085665), (8.9, 5.1))
            Line((8.9, 5.1), (3.464539294, 5.1))
            ThreePointArc((3.464539294, 5.1), (1.05, 4), (-1.364539294, 5.1))
        make_face()
    extrude(amount=CUT_EXTRUDE9_DEPTH, mode=Mode.SUBTRACT)

    # Sketch15 → Cut-Extrude10 (cut)
    with BuildSketch(Plane.XY.offset(CUT_EXTRUDE10_START)):
        with BuildLine():
            ThreePointArc((-0.553901493, 0.9), (-1.371208921, 0.393367228), (-2.037474696, -0.3))
            Line((-2.037474696, -0.3), (-1.174859546, -0.3))
            ThreePointArc((-1.174859546, -0.3), (1.05, 0.6), (3.274859546, -0.3))
            Line((3.274859546, -0.3), (4.137474696, -0.3))
            ThreePointArc((4.137474696, -0.3), (3.471208921, 0.393367228), (2.653901493, 0.9))
            Line((2.653901493, 0.9), (-0.553901493, 0.9))
        make_face()
    extrude(amount=CUT_EXTRUDE10_DEPTH, mode=Mode.SUBTRACT)


solid = part.part
